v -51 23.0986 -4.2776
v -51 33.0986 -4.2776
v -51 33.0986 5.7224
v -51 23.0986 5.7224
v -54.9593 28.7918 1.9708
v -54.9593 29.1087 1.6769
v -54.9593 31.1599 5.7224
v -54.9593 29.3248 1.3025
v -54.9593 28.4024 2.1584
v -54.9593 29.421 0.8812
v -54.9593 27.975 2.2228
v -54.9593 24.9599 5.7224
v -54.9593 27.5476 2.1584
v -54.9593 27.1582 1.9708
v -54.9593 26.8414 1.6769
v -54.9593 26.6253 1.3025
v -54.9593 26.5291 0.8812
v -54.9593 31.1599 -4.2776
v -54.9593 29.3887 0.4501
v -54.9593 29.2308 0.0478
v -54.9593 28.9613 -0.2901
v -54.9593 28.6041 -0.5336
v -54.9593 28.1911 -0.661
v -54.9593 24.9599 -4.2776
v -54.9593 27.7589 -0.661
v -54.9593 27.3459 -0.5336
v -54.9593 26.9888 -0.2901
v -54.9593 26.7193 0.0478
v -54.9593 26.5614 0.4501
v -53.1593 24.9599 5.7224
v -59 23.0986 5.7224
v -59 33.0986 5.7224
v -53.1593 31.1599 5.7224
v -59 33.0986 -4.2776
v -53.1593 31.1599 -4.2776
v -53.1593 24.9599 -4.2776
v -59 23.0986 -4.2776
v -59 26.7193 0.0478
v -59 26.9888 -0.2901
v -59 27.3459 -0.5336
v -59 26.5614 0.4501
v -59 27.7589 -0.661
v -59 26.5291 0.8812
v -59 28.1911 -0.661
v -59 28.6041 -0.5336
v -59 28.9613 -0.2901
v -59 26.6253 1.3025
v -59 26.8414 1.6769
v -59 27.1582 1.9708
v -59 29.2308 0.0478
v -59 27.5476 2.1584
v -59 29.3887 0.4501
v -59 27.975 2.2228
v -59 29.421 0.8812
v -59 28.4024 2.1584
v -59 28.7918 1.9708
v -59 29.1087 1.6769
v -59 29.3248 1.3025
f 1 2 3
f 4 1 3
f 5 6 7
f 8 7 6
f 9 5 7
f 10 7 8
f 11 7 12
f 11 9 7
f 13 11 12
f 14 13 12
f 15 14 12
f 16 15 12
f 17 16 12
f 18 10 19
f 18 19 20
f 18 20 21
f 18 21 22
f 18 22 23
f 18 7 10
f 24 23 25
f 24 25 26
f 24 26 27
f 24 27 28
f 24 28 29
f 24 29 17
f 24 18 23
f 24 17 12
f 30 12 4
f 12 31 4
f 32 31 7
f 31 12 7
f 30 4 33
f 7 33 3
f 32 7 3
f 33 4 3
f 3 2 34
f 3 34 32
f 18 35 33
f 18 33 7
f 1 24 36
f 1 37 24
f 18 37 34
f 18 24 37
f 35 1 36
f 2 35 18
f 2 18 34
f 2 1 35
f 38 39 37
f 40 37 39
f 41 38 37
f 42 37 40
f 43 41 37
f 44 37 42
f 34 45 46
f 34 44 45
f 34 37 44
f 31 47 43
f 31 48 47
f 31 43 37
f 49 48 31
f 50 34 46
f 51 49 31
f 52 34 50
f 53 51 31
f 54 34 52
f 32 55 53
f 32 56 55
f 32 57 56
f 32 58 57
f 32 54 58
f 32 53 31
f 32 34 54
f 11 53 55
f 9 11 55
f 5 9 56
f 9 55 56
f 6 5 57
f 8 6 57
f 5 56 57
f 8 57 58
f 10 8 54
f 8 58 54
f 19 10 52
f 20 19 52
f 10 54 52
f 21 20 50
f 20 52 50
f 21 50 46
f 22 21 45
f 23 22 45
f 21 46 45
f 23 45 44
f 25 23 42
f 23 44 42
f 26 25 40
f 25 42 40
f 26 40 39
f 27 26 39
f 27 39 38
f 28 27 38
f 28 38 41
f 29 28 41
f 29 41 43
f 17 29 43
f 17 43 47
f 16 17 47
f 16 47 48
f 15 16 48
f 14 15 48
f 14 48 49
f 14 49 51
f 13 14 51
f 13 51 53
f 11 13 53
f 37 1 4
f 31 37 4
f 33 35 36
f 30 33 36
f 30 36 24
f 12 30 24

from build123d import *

# Parameters (mm, degrees)
SKETCH038_W             = 10
SKETCH038_H             = 10
PAD014_DEPTH            = 8
SKETCH039_R             = 1.45
POCKET009_DEPTH         = 5
SKETCH040_W             = 6.2
SKETCH040_H             = 1.8
POCKET010_DEPTH         = 15
BODY015_PLACEMENT_ANGLE = 90


with BuildPart() as part:
    # Sketch038 → Pad014 (new body)
    with BuildSketch(Plane.XY):
        with Locations((0.72243, -0.901424)):
            Rectangle(SKETCH038_W, SKETCH038_H)
    extrude(amount=PAD014_DEPTH)

    # Sketch039 (on Face6 of Pad014) → Pocket009 (cut)
    with BuildSketch(Plane.XY.offset(8)):
        with Locations((0.772802, -1.024983)):
            Circle(SKETCH039_R)
    extrude(amount=-POCKET009_DEPTH, mode=Mode.SUBTRACT)

    # Sketch040 (on Face2 of Pocket009) → Pocket010 (cut)
    with BuildSketch(Plane(origin=(-4.27757, 0, 0), x_dir=(0, -1, 0), z_dir=(-1, 0, 0))):
        with Locations((0.940135, 3.059345)):
            Rectangle(SKETCH040_W, SKETCH040_H)
    extrude(amount=-POCKET010_DEPTH, mode=Mode.SUBTRACT)


with BuildPart() as part_1:
    # Body015 placement: moved
    add(part.part.moved(Location((-51, 29, 0))).rotate(Axis((-51, 29, 0), (0, -1, 0)), BODY015_PLACEMENT_ANGLE))


solid = part_1.part
